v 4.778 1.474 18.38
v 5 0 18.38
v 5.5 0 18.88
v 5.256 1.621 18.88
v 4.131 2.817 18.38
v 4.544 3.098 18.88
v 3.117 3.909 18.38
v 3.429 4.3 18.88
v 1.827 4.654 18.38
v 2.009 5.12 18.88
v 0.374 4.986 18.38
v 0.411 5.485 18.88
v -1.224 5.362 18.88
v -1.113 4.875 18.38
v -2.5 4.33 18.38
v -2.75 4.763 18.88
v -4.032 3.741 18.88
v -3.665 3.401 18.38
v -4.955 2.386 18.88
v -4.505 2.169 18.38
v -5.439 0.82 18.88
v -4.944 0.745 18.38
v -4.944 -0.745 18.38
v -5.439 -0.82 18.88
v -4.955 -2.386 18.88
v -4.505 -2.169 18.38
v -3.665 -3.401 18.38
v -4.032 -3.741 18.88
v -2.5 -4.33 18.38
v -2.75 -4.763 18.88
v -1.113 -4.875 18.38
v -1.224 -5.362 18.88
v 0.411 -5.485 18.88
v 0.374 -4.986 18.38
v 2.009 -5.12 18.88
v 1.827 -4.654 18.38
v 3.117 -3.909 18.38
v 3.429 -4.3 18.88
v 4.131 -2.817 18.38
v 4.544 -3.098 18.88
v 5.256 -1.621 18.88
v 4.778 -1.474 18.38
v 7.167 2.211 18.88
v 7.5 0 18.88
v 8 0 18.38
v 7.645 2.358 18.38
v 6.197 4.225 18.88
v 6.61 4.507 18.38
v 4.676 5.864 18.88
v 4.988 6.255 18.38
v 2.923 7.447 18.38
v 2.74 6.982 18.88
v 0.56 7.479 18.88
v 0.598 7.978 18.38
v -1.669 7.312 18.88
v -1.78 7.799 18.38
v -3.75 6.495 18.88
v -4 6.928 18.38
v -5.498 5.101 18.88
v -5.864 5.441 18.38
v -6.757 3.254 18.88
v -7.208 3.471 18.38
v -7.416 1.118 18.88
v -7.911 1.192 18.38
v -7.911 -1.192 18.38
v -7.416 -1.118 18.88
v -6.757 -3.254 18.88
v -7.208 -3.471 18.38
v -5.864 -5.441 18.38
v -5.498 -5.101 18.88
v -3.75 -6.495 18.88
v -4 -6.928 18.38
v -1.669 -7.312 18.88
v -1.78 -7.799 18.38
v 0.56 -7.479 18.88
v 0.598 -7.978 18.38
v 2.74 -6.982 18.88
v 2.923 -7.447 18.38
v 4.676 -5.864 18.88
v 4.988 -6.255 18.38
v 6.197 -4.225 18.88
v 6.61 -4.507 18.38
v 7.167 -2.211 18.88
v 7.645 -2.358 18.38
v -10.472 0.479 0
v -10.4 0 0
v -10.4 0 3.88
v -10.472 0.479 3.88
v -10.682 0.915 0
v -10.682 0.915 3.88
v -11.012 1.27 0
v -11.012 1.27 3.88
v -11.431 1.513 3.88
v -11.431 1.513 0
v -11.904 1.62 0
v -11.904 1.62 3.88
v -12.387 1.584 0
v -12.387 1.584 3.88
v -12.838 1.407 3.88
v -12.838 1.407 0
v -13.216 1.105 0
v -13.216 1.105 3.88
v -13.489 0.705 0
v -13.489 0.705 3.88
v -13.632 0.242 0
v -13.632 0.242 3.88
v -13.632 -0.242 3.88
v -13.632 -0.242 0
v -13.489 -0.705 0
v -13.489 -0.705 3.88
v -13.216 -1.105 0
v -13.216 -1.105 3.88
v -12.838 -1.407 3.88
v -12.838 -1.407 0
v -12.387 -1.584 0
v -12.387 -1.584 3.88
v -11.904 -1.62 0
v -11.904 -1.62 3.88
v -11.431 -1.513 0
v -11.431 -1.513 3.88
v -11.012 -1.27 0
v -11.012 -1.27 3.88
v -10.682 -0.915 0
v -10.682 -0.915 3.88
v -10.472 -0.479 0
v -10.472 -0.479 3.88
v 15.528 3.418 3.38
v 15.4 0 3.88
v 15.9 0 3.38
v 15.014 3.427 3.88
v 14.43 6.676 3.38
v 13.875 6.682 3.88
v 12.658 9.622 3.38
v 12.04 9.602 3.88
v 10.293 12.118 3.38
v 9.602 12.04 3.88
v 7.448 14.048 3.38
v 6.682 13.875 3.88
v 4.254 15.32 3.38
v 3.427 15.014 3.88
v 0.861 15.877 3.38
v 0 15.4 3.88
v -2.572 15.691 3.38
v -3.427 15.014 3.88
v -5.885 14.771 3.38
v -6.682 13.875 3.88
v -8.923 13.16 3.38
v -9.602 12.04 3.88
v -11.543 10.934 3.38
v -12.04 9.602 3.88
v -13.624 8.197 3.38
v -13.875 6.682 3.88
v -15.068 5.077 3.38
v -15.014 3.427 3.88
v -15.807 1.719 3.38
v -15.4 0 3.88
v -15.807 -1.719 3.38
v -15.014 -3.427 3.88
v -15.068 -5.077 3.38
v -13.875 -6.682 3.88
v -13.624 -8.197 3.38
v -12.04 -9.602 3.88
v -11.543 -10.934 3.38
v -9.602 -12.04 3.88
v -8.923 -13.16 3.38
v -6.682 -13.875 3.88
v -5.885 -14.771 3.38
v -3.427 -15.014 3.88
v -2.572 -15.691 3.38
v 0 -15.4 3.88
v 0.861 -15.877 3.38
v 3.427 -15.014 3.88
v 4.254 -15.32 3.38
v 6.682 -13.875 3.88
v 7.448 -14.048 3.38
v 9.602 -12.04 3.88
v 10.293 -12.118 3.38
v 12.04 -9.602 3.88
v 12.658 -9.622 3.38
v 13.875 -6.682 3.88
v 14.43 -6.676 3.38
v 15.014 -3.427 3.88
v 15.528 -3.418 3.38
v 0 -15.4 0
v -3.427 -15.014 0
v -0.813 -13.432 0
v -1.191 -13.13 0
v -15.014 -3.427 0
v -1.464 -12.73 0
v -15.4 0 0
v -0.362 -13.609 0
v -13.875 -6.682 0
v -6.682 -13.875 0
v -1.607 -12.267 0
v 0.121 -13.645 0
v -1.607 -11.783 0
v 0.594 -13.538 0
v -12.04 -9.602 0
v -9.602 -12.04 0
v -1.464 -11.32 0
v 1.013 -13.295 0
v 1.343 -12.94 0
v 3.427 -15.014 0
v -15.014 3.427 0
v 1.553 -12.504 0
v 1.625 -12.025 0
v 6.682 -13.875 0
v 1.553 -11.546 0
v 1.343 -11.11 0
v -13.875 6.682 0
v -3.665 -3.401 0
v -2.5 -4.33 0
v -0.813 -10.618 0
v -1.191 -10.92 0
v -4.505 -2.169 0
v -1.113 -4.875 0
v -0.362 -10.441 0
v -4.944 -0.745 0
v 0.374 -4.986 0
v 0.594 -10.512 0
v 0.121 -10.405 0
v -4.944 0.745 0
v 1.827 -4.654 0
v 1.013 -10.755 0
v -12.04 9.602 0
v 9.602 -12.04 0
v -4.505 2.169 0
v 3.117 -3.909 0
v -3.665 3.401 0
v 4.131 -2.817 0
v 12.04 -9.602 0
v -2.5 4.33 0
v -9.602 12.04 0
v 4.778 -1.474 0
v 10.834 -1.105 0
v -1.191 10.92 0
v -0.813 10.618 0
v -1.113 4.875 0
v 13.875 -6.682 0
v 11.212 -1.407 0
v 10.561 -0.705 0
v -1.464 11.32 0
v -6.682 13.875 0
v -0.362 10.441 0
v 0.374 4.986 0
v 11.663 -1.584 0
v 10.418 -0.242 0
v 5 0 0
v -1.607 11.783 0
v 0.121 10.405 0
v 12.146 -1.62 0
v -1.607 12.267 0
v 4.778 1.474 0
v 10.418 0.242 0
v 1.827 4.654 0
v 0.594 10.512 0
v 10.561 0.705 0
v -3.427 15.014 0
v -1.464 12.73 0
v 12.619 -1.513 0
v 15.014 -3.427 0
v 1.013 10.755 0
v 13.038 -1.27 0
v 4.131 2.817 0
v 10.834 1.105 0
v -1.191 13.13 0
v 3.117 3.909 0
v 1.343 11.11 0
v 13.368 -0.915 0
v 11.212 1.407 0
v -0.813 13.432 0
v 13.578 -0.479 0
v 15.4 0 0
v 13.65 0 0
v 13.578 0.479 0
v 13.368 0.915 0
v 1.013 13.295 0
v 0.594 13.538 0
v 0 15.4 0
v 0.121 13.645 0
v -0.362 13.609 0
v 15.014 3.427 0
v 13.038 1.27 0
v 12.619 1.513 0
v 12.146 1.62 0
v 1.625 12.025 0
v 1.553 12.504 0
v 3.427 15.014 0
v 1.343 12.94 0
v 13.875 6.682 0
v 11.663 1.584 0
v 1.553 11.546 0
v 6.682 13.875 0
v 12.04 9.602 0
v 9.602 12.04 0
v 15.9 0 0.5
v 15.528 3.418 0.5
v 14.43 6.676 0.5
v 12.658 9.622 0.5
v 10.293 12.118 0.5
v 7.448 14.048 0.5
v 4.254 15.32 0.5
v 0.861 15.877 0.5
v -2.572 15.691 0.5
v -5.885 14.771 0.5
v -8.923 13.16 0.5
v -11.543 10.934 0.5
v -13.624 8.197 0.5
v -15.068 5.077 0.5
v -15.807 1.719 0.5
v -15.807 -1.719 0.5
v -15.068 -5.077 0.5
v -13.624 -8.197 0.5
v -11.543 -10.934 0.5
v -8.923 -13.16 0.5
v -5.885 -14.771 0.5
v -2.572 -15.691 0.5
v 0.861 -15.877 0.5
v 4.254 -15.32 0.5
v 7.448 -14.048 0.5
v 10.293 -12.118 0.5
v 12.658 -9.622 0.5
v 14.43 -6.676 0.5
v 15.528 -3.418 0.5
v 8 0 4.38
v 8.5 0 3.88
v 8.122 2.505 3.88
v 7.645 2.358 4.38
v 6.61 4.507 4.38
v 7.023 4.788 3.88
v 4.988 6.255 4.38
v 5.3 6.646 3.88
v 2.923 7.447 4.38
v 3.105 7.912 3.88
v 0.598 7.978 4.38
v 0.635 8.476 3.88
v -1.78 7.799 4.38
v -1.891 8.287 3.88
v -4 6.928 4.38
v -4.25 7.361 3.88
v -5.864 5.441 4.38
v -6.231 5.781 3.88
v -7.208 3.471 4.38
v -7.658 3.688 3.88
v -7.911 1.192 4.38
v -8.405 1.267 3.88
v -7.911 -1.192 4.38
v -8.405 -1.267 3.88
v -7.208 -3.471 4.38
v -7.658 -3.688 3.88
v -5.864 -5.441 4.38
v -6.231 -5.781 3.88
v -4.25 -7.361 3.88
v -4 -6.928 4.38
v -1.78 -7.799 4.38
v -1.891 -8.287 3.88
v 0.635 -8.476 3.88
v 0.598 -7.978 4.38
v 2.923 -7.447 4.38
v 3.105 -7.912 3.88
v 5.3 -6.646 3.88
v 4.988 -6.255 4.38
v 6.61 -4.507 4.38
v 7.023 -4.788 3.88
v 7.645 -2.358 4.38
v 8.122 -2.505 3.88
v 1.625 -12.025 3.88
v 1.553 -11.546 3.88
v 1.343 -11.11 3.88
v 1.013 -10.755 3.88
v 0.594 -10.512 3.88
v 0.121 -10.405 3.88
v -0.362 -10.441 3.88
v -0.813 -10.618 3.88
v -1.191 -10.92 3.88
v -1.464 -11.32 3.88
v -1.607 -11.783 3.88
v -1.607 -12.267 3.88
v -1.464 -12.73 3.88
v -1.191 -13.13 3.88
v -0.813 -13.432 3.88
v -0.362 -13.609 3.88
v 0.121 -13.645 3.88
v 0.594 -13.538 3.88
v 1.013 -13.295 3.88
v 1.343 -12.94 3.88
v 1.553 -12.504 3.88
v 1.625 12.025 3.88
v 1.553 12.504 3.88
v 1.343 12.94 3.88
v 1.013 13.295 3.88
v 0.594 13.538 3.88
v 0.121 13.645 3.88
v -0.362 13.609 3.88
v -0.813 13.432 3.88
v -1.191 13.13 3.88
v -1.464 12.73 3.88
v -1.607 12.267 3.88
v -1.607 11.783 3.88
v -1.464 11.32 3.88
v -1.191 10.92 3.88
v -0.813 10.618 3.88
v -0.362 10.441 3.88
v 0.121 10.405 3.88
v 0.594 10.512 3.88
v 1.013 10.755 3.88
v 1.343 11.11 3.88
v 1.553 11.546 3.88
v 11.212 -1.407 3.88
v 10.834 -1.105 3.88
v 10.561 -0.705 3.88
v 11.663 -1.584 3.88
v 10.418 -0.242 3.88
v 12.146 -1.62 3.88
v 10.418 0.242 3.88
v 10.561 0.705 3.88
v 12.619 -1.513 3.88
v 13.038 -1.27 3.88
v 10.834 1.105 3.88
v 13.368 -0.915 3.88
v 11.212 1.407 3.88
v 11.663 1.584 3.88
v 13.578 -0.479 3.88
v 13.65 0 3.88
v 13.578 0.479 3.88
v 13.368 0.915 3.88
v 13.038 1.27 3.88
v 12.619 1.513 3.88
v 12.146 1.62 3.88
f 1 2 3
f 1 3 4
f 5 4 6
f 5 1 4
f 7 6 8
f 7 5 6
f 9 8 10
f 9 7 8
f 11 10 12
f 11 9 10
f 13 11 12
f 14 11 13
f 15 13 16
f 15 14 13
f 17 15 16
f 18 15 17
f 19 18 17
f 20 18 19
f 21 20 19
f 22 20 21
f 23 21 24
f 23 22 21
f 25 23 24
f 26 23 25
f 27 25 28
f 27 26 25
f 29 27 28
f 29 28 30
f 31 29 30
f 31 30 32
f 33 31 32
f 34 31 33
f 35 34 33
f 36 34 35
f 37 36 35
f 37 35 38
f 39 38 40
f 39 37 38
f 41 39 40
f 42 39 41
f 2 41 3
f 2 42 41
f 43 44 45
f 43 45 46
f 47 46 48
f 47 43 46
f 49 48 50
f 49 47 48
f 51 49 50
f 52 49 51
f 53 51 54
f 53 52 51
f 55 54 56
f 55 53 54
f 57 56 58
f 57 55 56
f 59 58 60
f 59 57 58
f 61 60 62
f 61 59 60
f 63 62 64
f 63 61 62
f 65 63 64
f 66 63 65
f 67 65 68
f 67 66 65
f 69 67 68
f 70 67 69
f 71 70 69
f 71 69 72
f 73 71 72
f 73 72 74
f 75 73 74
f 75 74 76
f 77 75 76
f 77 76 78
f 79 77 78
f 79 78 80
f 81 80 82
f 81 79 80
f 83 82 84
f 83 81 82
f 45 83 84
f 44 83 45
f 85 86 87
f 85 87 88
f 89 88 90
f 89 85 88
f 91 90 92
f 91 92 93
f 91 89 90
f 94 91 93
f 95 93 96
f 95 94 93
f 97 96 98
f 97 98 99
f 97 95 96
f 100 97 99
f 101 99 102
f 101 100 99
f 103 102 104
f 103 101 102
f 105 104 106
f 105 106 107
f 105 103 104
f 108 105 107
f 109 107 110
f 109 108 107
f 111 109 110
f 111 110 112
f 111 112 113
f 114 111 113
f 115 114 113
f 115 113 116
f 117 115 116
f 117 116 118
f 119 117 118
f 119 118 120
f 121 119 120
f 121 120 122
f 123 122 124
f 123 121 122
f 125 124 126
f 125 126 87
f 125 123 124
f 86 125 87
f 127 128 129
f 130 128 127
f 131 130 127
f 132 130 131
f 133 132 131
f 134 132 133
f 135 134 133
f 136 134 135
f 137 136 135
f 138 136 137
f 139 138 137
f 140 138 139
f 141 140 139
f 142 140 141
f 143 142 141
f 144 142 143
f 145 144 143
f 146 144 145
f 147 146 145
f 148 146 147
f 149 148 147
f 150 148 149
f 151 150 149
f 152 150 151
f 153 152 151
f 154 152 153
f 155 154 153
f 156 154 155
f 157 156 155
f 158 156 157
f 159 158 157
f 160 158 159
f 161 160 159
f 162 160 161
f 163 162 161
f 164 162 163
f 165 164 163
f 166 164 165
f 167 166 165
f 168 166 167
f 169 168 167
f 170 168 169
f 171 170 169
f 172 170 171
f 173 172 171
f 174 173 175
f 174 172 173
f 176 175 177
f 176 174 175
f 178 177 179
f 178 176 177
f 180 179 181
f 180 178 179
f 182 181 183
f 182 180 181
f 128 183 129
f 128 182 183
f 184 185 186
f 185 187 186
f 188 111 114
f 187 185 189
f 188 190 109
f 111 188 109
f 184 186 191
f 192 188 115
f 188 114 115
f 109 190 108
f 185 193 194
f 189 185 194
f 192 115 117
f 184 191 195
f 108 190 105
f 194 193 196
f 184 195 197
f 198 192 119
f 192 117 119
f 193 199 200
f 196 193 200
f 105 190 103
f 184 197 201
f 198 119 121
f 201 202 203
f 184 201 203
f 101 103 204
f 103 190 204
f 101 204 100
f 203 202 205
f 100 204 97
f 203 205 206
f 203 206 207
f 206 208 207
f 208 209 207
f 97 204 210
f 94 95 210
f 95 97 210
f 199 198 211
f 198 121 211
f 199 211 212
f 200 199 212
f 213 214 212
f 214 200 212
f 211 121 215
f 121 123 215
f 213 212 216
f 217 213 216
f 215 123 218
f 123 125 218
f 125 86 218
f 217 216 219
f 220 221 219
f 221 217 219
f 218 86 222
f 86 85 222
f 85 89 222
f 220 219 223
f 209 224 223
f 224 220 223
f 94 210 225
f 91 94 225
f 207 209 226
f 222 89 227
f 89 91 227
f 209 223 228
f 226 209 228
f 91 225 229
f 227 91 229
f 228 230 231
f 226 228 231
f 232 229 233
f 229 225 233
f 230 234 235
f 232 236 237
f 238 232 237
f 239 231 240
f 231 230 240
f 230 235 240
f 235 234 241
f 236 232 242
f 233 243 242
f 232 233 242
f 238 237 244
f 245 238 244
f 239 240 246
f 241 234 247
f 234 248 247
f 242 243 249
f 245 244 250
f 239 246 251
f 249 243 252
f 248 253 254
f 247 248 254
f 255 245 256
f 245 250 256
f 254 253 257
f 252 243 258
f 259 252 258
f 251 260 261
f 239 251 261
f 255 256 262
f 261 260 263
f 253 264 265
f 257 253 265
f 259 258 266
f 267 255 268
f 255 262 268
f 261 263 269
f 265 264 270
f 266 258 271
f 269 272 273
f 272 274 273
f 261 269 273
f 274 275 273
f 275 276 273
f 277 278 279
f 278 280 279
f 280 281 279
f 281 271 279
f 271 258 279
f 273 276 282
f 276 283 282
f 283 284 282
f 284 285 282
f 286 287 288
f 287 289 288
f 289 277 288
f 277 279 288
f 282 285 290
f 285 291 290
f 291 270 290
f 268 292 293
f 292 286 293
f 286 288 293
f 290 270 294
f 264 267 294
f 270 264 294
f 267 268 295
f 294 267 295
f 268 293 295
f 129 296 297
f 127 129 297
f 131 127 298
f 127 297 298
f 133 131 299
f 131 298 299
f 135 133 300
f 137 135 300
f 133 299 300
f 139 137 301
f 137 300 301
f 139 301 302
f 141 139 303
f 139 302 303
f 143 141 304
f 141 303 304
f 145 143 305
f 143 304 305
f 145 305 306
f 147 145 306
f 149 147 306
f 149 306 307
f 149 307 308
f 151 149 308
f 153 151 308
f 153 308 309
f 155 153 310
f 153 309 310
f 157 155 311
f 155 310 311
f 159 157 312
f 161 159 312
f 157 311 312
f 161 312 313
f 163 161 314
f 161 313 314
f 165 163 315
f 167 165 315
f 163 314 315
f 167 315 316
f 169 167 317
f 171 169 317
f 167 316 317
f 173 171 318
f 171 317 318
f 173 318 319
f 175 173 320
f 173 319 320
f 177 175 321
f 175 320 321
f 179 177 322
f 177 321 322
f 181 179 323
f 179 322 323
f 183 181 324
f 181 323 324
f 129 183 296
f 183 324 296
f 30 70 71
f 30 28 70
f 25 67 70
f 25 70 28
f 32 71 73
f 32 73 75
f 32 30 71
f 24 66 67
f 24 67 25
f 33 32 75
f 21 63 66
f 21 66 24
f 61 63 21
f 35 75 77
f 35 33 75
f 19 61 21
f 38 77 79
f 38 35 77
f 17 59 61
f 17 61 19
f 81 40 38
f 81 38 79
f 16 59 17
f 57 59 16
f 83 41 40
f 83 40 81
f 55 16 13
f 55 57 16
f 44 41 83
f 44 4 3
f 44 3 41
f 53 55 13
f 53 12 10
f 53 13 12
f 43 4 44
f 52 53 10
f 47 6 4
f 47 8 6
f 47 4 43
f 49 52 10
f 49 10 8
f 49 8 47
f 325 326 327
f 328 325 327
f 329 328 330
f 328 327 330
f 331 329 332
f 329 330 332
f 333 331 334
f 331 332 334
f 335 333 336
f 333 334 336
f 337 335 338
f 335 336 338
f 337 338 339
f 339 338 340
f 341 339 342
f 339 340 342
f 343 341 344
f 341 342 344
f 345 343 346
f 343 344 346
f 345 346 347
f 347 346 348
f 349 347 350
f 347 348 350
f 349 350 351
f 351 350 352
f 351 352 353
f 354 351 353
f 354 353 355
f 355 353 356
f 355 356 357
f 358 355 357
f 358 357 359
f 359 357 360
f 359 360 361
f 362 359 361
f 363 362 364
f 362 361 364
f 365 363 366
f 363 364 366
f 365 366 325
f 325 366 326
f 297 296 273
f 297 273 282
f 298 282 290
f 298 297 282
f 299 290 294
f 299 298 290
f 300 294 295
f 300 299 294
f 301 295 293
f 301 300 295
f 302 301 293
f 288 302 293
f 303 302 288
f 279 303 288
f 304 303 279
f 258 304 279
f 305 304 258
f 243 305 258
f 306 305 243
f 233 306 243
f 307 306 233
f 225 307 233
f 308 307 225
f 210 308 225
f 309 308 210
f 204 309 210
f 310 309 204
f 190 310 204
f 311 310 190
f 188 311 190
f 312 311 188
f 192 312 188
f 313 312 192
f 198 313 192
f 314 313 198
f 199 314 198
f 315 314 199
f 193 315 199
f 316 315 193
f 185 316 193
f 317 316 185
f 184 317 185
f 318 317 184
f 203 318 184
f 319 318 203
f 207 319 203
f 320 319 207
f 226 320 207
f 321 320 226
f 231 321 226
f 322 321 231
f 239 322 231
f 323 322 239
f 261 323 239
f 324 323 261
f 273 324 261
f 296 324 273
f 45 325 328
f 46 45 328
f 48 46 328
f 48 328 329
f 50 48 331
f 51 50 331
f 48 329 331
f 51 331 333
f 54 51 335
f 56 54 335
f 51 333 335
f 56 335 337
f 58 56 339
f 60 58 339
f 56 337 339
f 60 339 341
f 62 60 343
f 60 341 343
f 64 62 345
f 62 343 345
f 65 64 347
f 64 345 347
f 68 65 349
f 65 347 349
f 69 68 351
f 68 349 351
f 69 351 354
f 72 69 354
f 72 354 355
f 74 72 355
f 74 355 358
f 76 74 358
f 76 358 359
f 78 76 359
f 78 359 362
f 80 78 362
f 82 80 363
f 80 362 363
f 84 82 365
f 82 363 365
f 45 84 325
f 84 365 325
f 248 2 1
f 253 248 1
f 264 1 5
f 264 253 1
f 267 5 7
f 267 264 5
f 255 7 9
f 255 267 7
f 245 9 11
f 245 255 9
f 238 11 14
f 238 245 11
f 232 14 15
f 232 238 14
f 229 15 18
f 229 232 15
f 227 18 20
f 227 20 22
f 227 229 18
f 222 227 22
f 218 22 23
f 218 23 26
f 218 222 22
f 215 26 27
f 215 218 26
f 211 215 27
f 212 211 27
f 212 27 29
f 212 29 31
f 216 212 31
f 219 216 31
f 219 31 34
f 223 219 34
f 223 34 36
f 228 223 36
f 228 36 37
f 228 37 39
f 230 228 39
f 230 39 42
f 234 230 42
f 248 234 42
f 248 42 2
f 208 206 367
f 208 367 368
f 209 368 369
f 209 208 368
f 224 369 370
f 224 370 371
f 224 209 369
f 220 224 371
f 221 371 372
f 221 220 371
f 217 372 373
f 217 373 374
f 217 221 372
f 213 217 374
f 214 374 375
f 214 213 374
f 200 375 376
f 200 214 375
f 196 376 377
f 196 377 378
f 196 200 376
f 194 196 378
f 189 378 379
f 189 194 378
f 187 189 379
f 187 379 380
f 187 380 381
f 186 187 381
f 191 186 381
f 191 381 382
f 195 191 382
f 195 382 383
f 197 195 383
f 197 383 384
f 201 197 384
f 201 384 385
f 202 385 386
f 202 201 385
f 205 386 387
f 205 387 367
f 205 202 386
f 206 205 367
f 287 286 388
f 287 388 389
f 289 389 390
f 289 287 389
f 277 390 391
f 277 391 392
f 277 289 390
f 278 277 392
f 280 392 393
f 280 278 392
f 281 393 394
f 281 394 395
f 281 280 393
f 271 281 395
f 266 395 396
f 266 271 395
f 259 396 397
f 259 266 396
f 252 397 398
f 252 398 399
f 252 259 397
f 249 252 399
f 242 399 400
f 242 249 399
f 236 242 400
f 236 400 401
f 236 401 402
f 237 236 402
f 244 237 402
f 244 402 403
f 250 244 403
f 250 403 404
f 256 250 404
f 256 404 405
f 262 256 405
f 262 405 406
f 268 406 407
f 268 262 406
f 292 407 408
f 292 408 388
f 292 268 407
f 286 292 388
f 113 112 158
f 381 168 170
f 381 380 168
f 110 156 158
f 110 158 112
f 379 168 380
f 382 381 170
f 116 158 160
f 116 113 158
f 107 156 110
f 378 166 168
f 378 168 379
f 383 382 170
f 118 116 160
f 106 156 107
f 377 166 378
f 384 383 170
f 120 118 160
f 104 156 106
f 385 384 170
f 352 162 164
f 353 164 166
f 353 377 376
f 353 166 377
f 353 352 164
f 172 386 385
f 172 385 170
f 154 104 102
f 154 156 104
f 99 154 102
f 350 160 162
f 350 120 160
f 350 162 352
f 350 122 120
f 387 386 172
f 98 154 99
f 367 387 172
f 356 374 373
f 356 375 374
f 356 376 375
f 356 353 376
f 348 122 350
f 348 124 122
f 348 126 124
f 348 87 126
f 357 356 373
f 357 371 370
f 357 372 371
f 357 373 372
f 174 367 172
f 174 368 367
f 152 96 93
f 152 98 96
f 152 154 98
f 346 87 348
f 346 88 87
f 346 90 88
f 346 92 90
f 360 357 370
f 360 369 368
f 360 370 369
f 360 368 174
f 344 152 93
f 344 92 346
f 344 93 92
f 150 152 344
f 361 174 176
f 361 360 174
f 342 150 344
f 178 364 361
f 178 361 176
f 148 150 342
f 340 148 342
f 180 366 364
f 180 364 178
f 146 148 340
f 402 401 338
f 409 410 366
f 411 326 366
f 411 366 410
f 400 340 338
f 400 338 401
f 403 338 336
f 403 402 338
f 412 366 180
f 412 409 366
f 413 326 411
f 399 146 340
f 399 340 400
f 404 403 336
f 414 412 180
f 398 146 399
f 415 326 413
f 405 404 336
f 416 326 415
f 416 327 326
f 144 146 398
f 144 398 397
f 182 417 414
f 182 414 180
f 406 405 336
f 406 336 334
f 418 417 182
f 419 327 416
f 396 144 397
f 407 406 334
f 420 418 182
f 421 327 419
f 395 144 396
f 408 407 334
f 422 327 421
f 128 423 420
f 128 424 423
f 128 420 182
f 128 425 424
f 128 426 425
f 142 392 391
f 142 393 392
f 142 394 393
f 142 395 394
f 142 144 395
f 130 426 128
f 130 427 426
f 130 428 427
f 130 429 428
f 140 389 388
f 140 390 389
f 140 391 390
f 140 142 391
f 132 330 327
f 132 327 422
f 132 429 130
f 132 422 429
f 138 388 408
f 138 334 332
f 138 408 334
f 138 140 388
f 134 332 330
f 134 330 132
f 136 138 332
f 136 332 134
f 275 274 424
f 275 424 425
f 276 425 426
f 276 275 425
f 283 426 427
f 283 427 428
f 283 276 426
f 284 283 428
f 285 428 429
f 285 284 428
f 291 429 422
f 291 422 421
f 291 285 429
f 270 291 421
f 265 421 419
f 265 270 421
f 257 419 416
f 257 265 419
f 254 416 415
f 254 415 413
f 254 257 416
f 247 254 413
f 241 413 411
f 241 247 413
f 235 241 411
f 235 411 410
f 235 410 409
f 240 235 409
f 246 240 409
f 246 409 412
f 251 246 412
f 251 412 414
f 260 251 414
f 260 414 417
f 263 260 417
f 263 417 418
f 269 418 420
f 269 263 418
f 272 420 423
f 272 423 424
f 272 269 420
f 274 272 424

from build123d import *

# Parameters (mm, degrees)
SKETCH1_R           = 15.9
SKETCH1_R_2         = 5
SKETCH1_R_3         = 1.625
BOSS_EXTRUDE1_DEPTH = 3.88
SKETCH2_R           = 8
SKETCH2_R_2         = 5
BOSS_EXTRUDE2_DEPTH = 15
CHAMFER1_SIZE       = 0.5


with BuildPart() as part:
    # Sketch1 → Boss-Extrude1 (new body)
    with BuildSketch(Plane.XY):
        Circle(SKETCH1_R)
        Circle(SKETCH1_R_2, mode=Mode.SUBTRACT)
        with Locations((0, 12.025)):
            Circle(SKETCH1_R_3, mode=Mode.SUBTRACT)
        with Locations((12.025, 0)):
            Circle(SKETCH1_R_3, mode=Mode.SUBTRACT)
        with Locations((0, -12.025)):
            Circle(SKETCH1_R_3, mode=Mode.SUBTRACT)
        with Locations((-12.025, 0)):
            Circle(SKETCH1_R_3, mode=Mode.SUBTRACT)
    extrude(amount=BOSS_EXTRUDE1_DEPTH)

    # Sketch2 → Boss-Extrude2 (add)
    with BuildSketch(Plane.XY.offset(3.88)):
        Circle(SKETCH2_R)
        Circle(SKETCH2_R_2, mode=Mode.SUBTRACT)
    extrude(amount=BOSS_EXTRUDE2_DEPTH)

    # Chamfer1
    chamfer1_edges = [part.edges().sort_by_distance(p)[0] for p in [
        (-15.9, 0, 0),
        (-8, 0, 18.88),
        (-8, 0, 3.88),
        (-5, 0, 18.88),
        (-15.9, 0, 3.88),
    ]]
    chamfer(chamfer1_edges, length=CHAMFER1_SIZE)


solid = part.part
